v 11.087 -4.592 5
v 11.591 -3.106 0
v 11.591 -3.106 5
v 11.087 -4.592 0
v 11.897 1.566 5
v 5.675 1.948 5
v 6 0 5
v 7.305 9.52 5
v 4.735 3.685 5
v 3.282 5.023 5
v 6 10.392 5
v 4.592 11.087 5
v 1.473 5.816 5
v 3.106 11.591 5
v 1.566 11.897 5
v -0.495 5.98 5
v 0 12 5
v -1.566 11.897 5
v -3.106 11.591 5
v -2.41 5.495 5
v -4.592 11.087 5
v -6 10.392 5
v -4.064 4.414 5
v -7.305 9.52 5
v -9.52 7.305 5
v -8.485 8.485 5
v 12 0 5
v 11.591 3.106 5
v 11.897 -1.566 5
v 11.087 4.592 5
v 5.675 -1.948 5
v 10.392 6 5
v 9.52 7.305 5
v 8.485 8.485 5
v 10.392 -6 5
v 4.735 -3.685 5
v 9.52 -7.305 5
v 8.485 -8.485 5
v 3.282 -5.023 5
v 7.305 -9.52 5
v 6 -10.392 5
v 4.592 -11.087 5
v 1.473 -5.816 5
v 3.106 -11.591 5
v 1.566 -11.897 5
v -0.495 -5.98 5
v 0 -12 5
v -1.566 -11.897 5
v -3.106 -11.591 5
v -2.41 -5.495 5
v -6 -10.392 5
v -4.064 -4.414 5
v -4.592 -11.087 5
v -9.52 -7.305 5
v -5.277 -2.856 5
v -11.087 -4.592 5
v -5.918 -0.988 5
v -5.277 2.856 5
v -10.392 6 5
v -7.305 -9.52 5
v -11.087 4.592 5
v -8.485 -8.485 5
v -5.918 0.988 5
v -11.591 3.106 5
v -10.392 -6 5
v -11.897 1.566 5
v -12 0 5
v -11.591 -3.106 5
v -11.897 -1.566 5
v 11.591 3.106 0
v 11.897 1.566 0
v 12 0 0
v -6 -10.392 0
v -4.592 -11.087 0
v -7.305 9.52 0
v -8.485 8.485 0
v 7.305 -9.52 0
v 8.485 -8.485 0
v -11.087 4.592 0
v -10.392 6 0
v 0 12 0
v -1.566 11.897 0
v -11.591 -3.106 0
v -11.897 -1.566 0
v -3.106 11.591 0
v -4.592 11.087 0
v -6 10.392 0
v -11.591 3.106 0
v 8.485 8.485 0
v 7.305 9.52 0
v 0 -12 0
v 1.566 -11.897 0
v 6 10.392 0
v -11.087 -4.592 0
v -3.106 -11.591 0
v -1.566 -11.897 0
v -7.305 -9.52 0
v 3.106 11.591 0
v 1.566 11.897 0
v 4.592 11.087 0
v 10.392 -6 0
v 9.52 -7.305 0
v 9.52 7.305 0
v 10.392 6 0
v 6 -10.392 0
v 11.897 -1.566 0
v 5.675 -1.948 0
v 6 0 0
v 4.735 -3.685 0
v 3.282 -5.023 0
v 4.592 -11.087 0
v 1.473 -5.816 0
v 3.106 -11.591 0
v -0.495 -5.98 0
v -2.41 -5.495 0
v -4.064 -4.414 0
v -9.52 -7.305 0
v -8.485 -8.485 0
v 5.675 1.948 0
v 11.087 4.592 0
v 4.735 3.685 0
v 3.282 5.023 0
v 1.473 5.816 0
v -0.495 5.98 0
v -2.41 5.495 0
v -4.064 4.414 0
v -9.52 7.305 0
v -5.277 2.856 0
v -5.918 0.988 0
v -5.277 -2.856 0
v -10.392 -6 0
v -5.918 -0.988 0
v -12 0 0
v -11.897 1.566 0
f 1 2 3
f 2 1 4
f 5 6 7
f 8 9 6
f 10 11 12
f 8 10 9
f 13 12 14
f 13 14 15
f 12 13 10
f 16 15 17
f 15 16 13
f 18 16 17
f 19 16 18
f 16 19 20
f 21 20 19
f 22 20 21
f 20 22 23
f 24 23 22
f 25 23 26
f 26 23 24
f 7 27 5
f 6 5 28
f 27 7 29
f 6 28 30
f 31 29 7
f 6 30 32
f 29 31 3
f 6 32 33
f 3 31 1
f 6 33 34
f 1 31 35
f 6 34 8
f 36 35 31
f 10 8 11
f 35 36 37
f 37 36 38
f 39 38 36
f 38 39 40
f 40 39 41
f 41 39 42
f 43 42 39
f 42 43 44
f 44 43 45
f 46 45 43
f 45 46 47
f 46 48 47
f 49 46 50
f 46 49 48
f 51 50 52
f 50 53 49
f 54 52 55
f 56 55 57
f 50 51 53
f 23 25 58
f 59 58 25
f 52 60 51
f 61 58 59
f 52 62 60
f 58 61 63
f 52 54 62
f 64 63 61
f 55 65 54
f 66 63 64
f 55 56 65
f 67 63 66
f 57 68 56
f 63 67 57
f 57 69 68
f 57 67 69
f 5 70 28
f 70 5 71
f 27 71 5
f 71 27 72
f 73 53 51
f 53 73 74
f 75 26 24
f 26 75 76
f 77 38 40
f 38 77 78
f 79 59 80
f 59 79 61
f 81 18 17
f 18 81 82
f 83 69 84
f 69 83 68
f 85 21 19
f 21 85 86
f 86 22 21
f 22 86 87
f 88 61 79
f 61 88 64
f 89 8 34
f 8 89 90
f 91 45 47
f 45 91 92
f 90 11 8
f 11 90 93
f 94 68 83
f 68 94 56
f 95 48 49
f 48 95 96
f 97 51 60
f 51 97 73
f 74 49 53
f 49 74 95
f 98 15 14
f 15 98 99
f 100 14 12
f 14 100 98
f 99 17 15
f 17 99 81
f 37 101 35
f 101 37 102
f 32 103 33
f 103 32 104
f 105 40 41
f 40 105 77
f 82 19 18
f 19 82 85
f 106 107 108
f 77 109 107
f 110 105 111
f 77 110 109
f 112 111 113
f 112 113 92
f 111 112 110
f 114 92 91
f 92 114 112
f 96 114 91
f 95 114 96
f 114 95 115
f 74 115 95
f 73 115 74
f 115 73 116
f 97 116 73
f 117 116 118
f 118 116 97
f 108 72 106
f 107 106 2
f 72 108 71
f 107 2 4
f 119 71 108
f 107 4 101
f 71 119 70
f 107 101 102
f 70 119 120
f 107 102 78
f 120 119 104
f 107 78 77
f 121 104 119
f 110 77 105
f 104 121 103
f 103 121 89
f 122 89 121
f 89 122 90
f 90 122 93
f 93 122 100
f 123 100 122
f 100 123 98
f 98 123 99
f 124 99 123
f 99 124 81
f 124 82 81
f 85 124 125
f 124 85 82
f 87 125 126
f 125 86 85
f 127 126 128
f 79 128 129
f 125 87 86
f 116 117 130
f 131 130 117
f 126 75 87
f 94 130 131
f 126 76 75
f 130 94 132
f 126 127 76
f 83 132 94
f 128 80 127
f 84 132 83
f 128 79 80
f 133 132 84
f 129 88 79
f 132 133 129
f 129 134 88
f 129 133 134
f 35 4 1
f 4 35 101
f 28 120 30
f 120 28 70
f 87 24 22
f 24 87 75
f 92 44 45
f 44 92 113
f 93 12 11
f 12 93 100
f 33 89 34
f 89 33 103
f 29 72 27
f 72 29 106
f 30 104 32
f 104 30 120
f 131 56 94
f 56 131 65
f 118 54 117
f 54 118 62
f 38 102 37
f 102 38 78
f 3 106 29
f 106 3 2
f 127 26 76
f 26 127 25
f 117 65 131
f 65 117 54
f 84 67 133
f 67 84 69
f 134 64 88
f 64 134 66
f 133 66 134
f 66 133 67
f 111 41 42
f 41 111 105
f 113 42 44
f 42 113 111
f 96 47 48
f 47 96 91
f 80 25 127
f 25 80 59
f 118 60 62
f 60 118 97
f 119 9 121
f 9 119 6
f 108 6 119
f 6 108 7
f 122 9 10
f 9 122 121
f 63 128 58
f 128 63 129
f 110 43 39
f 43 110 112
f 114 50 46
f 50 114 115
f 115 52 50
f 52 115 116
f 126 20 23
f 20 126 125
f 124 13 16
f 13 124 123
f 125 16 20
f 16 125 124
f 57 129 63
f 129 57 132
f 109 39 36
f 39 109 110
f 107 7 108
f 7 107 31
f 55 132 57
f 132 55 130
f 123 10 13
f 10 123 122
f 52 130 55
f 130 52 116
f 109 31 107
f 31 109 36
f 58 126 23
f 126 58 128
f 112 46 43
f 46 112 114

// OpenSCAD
// gear_param.scad
// param: module=2, teeth=12, thickness=5
module param_gear(module_val=2, teeth=12, thickness=5) {
    difference() {
        cylinder(h = thickness, r = (module_val*teeth)/2, $fn=teeth*4);
        cylinder(h = thickness+1, r = (module_val*teeth)/4);
    }
}
param_gear(module_val=2, teeth=12, thickness=5);
